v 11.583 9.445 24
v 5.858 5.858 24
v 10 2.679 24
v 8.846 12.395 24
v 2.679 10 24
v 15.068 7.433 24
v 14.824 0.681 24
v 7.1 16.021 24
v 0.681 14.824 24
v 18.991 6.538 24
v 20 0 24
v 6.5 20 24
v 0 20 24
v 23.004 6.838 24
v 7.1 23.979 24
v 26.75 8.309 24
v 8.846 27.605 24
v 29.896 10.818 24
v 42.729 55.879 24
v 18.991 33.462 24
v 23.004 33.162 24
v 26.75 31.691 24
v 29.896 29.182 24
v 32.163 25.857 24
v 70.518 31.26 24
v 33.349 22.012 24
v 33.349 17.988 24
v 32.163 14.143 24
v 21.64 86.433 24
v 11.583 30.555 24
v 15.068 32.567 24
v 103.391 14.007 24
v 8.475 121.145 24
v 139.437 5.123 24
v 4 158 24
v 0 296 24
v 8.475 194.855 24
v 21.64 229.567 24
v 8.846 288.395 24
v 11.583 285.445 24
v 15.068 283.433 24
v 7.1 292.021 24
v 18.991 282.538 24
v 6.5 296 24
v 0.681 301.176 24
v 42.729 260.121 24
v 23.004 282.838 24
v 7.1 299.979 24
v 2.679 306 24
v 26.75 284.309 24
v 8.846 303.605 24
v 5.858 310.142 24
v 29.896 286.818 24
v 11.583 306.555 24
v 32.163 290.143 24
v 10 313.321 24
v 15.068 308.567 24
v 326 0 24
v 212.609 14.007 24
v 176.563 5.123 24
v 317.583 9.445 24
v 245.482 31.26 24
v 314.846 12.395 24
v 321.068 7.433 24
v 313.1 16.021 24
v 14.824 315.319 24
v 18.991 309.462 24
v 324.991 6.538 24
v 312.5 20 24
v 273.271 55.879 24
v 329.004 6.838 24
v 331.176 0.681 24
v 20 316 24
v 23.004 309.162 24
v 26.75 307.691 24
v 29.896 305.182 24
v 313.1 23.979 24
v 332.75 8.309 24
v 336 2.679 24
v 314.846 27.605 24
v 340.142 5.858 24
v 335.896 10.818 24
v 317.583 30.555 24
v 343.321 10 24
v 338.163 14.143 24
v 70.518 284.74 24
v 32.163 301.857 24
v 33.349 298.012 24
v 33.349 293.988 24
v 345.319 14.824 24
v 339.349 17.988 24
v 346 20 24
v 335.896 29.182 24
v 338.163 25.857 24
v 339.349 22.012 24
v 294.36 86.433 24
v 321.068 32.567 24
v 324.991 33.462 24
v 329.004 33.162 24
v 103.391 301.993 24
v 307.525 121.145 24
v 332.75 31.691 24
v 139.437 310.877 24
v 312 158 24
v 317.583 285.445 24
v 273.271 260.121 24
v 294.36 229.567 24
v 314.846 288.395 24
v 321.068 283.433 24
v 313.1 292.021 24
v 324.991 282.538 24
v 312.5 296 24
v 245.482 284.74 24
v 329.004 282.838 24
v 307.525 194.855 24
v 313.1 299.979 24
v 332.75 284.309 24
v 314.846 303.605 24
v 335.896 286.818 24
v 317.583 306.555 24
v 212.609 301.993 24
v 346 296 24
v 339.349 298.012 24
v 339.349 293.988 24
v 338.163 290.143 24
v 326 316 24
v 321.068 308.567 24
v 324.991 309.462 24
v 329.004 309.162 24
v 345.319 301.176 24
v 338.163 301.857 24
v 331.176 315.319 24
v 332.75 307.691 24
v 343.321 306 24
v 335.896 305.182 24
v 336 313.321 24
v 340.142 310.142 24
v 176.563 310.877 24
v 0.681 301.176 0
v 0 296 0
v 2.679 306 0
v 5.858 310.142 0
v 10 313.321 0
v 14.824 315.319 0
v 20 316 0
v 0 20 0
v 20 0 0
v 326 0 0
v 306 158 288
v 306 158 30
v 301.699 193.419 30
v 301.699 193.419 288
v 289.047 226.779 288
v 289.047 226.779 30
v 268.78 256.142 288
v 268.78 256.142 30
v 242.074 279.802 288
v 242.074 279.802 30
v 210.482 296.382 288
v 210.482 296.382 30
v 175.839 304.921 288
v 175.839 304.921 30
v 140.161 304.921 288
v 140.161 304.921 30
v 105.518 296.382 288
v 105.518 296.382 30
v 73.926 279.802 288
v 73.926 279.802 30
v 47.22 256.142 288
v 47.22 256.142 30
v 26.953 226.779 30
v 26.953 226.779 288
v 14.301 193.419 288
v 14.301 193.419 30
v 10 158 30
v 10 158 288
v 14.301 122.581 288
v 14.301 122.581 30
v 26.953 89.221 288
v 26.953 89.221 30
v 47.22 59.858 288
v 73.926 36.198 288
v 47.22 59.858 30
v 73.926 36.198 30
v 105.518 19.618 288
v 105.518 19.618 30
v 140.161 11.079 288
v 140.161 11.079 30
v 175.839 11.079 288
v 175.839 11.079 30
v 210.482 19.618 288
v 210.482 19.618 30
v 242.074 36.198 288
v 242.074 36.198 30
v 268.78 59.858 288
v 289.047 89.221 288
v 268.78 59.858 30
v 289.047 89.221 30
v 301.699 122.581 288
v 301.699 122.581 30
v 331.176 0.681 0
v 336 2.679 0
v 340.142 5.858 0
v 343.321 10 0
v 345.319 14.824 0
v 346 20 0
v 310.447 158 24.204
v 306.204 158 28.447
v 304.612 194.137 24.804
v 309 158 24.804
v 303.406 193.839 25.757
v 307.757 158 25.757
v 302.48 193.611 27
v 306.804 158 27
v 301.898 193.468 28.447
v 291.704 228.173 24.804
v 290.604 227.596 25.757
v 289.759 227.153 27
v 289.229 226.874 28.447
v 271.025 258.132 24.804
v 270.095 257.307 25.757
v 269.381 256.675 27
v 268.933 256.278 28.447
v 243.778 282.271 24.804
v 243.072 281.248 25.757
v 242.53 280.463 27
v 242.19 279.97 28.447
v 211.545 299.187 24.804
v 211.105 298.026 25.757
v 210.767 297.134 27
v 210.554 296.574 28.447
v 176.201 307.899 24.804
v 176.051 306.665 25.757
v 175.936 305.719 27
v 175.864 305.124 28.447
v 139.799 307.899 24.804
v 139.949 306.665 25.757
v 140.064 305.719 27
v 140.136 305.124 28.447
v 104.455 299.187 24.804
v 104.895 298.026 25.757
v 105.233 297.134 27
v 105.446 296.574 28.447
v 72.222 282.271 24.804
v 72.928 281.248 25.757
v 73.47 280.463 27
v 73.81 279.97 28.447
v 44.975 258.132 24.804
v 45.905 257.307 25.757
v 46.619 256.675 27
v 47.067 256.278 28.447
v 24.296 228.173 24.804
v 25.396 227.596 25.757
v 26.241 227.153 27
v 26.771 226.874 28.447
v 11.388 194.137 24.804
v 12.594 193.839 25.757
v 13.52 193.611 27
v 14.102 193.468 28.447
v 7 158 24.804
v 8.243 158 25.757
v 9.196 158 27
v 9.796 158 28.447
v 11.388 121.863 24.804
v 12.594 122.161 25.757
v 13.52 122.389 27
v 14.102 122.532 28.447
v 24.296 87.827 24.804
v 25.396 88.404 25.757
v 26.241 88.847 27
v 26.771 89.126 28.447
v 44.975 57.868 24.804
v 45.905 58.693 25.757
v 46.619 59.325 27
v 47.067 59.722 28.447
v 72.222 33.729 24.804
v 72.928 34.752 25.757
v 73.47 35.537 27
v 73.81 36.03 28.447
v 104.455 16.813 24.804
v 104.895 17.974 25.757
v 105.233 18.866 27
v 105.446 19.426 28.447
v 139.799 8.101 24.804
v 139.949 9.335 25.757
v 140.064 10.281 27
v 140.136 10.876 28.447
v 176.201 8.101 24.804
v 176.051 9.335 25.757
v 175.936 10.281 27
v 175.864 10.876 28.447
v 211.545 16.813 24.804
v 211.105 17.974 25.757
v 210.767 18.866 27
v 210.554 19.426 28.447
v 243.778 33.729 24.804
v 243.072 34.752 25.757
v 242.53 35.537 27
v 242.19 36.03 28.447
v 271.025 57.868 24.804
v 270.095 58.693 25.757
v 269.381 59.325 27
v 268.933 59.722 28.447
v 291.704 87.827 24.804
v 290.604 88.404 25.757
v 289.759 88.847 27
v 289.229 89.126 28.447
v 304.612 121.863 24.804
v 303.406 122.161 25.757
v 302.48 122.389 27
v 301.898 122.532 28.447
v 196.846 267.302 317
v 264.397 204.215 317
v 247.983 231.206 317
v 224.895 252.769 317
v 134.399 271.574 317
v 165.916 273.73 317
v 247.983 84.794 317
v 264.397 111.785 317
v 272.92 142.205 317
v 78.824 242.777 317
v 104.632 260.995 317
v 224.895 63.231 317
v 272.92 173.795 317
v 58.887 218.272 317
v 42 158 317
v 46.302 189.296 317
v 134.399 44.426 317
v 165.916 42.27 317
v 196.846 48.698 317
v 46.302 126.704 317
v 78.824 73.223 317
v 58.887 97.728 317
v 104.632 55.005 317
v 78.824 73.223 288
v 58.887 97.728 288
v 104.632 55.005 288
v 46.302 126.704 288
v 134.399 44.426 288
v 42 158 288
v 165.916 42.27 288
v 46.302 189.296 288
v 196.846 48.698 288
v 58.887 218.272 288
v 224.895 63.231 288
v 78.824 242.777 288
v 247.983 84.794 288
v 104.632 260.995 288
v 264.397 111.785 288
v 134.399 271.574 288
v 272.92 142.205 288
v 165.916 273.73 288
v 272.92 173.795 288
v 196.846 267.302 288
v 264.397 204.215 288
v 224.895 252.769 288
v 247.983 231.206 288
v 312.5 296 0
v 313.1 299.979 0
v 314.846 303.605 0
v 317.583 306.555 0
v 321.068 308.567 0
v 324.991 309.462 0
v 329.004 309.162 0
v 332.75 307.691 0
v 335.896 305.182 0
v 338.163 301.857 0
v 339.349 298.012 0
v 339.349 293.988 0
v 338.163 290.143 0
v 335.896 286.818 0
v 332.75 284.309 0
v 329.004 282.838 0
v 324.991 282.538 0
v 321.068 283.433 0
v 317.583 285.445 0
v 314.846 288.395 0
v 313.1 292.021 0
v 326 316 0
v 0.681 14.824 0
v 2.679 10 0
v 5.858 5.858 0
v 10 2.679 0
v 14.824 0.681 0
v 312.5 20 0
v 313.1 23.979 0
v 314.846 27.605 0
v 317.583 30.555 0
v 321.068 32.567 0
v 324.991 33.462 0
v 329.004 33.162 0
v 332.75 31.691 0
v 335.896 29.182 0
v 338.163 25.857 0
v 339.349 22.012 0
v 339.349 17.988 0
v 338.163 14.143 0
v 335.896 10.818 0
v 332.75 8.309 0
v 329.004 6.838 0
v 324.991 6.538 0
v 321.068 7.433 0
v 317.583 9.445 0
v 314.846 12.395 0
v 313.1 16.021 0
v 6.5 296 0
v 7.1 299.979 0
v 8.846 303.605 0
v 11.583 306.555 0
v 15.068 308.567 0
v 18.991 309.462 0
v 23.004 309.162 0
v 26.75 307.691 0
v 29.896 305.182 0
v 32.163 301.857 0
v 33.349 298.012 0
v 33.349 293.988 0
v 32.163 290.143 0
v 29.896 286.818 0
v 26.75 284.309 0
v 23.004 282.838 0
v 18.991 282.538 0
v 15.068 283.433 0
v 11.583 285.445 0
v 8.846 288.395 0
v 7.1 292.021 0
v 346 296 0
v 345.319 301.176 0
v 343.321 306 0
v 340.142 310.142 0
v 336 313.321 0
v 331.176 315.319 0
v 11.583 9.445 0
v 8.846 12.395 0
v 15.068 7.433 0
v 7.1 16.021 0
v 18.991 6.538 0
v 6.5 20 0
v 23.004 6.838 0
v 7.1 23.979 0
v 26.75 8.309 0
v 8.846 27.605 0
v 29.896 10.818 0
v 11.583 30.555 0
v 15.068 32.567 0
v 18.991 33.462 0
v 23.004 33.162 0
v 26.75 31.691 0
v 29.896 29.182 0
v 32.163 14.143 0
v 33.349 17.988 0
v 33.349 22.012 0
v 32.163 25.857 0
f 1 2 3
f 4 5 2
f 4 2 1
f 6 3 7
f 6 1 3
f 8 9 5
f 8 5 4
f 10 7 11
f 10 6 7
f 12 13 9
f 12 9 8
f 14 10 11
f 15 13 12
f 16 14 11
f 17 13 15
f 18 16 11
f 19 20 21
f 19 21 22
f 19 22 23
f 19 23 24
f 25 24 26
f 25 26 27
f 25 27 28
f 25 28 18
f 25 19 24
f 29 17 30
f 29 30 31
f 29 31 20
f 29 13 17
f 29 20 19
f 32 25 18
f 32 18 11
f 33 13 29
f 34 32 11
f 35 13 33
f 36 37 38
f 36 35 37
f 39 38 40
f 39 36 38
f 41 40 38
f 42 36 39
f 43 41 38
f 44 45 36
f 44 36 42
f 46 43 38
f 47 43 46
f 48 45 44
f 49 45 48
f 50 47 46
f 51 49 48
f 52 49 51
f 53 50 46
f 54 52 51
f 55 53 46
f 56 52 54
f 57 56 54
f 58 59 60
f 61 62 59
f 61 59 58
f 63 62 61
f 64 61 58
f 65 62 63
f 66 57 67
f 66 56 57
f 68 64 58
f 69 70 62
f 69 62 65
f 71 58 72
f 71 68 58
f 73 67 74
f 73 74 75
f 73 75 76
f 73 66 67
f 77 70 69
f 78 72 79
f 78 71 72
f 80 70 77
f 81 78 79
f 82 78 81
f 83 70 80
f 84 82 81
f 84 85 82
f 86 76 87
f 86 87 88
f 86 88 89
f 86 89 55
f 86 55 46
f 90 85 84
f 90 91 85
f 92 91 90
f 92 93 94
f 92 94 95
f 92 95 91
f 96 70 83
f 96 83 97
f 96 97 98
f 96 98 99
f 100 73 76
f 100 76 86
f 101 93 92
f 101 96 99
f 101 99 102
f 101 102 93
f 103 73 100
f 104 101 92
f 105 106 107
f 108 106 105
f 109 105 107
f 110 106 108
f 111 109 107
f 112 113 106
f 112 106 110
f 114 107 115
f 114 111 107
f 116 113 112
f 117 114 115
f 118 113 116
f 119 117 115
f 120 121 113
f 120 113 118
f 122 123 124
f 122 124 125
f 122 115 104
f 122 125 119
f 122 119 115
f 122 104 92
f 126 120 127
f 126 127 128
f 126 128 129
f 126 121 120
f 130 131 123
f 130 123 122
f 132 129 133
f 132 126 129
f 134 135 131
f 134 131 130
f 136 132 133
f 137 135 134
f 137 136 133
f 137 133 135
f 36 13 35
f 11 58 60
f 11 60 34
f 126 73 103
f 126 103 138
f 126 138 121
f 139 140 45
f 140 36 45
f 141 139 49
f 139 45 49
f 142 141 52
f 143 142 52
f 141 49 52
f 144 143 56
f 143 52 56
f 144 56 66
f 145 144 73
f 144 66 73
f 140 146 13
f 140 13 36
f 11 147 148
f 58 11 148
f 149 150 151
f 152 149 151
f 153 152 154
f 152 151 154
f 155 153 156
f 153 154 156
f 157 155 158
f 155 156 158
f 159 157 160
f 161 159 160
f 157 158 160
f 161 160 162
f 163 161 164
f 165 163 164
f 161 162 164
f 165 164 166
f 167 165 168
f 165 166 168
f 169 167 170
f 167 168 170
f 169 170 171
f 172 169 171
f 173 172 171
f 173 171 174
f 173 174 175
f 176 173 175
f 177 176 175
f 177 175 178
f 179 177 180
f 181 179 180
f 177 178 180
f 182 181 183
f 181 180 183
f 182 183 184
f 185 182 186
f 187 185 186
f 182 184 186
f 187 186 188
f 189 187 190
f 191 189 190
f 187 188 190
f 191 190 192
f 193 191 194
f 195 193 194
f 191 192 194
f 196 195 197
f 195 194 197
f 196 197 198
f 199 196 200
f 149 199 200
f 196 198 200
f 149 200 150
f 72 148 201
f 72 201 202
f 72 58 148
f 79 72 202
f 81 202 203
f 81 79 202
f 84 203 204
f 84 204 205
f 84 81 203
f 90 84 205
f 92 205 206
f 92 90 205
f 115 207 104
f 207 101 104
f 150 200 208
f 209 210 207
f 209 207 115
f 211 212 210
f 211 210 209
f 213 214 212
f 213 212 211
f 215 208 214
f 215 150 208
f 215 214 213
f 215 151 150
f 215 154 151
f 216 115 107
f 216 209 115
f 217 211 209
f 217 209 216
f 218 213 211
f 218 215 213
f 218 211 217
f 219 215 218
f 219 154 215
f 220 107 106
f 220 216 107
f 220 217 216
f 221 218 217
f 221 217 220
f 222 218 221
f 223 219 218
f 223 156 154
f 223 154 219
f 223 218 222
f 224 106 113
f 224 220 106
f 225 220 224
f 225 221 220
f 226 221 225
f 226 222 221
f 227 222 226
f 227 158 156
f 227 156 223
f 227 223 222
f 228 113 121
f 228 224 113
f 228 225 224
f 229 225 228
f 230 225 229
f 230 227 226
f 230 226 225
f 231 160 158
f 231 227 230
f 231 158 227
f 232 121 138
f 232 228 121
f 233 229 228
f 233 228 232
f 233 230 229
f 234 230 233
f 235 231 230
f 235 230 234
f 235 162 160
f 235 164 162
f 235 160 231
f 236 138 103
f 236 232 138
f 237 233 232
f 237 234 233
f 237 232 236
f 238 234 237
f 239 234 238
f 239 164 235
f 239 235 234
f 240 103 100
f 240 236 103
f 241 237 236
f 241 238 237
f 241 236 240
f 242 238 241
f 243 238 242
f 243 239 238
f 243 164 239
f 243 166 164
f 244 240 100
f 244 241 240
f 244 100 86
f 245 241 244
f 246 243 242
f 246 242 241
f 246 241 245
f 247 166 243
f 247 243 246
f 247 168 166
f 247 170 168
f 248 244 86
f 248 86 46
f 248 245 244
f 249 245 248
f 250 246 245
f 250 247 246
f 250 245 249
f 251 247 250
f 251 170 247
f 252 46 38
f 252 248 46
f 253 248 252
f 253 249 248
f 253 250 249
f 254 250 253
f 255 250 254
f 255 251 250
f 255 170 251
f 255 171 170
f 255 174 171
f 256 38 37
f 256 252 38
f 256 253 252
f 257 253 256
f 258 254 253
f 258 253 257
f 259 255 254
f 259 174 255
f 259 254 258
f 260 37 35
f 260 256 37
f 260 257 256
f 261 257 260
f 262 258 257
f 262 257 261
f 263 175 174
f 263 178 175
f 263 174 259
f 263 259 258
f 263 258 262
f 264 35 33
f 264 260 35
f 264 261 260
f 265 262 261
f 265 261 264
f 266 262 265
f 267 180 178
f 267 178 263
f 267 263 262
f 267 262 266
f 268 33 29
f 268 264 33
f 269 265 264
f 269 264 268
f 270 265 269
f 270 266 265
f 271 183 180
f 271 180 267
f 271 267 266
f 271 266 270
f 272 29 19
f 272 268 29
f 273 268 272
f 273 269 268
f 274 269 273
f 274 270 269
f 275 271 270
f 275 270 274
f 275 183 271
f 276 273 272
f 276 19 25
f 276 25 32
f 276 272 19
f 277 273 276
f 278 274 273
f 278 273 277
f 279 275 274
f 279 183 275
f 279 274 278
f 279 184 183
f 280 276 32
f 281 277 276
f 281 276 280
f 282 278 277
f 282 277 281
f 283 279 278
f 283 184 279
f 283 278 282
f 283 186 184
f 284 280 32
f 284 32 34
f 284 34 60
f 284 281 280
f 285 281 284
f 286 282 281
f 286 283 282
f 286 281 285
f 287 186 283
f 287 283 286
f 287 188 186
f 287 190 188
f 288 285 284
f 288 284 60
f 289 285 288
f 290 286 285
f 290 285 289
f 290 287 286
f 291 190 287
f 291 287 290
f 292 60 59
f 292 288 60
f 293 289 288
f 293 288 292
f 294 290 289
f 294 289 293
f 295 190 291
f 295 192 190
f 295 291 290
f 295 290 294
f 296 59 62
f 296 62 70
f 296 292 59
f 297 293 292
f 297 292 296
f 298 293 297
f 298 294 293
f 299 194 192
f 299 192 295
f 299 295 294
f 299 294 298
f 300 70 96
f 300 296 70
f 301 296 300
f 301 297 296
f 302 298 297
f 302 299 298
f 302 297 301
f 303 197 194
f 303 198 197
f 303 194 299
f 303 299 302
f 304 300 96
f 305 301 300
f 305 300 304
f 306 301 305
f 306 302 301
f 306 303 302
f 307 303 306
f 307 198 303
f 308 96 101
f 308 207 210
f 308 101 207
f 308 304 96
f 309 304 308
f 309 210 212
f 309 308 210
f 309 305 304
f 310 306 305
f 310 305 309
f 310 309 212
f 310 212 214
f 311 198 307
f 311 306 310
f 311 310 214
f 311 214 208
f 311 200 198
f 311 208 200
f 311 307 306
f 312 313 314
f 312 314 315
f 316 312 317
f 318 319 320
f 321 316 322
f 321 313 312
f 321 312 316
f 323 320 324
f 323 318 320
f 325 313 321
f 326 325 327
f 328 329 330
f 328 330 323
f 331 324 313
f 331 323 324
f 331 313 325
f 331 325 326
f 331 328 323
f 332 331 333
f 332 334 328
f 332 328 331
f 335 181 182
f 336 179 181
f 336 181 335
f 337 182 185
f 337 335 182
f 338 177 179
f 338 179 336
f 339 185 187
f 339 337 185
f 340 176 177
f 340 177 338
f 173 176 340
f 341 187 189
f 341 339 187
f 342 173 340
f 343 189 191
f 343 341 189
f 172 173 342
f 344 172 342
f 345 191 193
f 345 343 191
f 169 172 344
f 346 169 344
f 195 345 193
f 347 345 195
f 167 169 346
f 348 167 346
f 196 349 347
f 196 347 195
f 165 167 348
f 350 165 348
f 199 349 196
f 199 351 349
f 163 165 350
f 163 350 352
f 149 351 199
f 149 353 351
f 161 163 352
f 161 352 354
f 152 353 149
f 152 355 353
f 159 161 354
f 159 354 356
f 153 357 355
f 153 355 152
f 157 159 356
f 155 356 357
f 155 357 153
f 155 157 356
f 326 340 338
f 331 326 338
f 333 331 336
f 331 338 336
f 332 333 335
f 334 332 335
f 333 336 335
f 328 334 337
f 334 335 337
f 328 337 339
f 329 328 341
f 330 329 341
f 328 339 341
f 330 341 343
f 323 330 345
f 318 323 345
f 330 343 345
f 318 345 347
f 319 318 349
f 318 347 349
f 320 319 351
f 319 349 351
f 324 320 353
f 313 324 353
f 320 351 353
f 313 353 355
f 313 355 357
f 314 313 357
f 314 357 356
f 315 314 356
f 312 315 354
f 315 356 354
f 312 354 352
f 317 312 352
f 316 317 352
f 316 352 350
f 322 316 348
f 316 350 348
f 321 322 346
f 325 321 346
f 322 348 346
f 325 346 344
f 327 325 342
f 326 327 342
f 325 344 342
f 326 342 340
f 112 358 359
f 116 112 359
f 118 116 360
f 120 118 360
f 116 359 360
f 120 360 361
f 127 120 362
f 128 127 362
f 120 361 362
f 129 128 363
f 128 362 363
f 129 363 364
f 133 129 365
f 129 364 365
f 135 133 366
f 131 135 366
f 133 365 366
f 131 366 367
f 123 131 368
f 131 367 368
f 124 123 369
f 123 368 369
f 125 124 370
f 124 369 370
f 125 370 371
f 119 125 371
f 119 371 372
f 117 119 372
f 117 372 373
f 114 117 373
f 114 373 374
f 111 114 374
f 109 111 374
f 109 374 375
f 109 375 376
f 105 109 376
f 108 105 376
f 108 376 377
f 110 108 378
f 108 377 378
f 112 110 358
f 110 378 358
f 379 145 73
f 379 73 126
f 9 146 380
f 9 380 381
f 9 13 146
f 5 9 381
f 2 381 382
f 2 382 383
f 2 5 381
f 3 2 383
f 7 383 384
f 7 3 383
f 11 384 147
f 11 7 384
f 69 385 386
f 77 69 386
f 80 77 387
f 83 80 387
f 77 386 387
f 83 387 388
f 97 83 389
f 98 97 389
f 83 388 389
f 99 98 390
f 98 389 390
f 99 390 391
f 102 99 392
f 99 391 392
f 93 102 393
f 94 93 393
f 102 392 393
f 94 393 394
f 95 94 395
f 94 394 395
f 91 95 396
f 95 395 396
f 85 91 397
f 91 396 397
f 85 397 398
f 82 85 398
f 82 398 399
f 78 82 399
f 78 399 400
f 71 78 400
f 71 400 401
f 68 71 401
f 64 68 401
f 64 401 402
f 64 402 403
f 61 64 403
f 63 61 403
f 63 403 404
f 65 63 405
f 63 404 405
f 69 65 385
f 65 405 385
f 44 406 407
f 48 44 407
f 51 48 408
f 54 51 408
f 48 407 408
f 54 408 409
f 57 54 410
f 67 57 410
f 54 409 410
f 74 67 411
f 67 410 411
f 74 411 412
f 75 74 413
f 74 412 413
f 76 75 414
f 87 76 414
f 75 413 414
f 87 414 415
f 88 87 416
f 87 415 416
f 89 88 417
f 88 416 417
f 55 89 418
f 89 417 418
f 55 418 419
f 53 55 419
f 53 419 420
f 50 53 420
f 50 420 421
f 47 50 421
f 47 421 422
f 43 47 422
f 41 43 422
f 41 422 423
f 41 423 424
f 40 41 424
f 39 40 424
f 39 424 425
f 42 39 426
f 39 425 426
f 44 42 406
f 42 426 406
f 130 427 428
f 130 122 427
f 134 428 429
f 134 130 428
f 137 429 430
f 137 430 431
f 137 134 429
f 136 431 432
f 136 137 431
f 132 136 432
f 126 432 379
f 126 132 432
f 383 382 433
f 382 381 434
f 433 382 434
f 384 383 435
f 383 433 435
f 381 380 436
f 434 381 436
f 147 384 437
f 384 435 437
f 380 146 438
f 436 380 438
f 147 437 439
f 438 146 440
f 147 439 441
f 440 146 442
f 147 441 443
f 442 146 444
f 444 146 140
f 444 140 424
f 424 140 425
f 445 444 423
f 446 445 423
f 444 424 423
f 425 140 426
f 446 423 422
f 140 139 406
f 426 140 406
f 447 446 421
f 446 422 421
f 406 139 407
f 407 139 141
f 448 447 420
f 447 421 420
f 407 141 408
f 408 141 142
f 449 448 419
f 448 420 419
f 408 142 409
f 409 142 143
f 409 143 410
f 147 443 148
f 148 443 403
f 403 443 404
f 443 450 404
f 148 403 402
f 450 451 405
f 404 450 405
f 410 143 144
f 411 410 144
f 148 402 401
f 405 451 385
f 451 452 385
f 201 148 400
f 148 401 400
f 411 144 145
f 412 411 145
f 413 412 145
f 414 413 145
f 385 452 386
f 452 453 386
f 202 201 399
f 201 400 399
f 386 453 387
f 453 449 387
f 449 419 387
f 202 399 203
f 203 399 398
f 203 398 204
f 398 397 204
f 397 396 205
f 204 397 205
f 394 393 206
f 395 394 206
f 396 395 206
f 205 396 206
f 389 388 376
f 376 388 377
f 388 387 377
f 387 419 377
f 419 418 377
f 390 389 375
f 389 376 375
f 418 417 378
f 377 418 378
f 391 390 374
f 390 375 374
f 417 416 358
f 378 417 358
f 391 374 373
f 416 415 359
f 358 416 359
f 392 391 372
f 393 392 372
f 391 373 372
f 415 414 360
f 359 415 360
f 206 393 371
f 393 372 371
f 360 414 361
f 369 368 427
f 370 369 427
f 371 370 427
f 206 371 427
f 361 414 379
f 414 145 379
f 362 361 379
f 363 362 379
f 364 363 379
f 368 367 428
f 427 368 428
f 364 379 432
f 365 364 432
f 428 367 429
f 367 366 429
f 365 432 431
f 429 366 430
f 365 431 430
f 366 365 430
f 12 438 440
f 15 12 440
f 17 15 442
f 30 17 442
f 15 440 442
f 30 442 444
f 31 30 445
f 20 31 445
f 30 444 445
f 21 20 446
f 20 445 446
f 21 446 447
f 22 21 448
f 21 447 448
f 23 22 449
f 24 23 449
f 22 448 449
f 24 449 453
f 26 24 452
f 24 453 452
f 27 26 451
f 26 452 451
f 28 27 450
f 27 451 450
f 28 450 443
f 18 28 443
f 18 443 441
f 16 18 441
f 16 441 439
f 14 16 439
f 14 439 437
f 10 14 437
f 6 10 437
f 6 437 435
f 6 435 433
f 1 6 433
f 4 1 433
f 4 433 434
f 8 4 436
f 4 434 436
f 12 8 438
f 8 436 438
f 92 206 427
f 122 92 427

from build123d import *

# Parameters (mm, degrees)
SKIZZE1_W                       = 173
SKIZZE1_H                       = 158
AUFSATZ_LINEAR_AUSTRAGEN1_DEPTH = 12
VERRUNDUNG1_R                   = 10
SKIZZE2_R                       = 74
AUFSATZ_LINEAR_AUSTRAGEN2_DEPTH = 132
SKIZZE3_R                       = 58
AUFSATZ_LINEAR_AUSTRAGEN3_DEPTH = 14.5
SKIZZE4_R                       = 6.75
SCHNITT_LINEAR_AUSTRAGEN1_DEPTH = 12
VERRUNDUNG2_R                   = 3
SKALIEREN1_SCALE                = 2


with BuildPart() as part:
    # Skizze1 → Aufsatz-Linear austragen1 (new body)
    with BuildSketch(Plane.XY):
        with Locations((86.5, 79)):
            Rectangle(SKIZZE1_W, SKIZZE1_H)
    extrude(amount=AUFSATZ_LINEAR_AUSTRAGEN1_DEPTH)

    # Verrundung1
    verrundung1_edges = [part.edges().sort_by_distance(p)[0] for p in [
        (0, 158, 6),
        (173, 158, 6),
        (173, 0, 6),
        (0, 0, 6),
    ]]
    fillet(verrundung1_edges, radius=VERRUNDUNG1_R)

    # Skizze2 → Aufsatz-Linear austragen2 (add)
    with BuildSketch(Plane.XY.offset(12)):
        with Locations((79, 79)):
            Circle(SKIZZE2_R)
    extrude(amount=AUFSATZ_LINEAR_AUSTRAGEN2_DEPTH)

    # Skizze3 → Aufsatz-Linear austragen3 (add)
    with BuildSketch(Plane.XY.offset(144)):
        with Locations(Location((79, 79, 0), (0, 0, 180))):
            Circle(SKIZZE3_R)
    extrude(amount=AUFSATZ_LINEAR_AUSTRAGEN3_DEPTH)

    # Skizze4 → Schnitt-Linear austragen1 (cut)
    with BuildSketch(Plane(origin=(0, 0, 0), x_dir=(-1, 0, 0), z_dir=(0, 0, -1))):
        with Locations((-163, 148)):
            Circle(SKIZZE4_R)
        with Locations((-10, 148)):
            Circle(SKIZZE4_R)
        with Locations((-10, 10)):
            Circle(SKIZZE4_R)
        with Locations((-163, 10)):
            Circle(SKIZZE4_R)
    extrude(amount=-SCHNITT_LINEAR_AUSTRAGEN1_DEPTH, mode=Mode.SUBTRACT)

    # Verrundung2
    verrundung2_edges = [part.edges().sort_by_distance(p)[0] for p in [
        (5, 79, 12),
    ]]
    fillet(verrundung2_edges, radius=VERRUNDUNG2_R)


with BuildPart() as part_1:
    # Skalieren1: scaled about (0, 0, 0)
    add(part.part.scale(SKALIEREN1_SCALE))


solid = part_1.part
